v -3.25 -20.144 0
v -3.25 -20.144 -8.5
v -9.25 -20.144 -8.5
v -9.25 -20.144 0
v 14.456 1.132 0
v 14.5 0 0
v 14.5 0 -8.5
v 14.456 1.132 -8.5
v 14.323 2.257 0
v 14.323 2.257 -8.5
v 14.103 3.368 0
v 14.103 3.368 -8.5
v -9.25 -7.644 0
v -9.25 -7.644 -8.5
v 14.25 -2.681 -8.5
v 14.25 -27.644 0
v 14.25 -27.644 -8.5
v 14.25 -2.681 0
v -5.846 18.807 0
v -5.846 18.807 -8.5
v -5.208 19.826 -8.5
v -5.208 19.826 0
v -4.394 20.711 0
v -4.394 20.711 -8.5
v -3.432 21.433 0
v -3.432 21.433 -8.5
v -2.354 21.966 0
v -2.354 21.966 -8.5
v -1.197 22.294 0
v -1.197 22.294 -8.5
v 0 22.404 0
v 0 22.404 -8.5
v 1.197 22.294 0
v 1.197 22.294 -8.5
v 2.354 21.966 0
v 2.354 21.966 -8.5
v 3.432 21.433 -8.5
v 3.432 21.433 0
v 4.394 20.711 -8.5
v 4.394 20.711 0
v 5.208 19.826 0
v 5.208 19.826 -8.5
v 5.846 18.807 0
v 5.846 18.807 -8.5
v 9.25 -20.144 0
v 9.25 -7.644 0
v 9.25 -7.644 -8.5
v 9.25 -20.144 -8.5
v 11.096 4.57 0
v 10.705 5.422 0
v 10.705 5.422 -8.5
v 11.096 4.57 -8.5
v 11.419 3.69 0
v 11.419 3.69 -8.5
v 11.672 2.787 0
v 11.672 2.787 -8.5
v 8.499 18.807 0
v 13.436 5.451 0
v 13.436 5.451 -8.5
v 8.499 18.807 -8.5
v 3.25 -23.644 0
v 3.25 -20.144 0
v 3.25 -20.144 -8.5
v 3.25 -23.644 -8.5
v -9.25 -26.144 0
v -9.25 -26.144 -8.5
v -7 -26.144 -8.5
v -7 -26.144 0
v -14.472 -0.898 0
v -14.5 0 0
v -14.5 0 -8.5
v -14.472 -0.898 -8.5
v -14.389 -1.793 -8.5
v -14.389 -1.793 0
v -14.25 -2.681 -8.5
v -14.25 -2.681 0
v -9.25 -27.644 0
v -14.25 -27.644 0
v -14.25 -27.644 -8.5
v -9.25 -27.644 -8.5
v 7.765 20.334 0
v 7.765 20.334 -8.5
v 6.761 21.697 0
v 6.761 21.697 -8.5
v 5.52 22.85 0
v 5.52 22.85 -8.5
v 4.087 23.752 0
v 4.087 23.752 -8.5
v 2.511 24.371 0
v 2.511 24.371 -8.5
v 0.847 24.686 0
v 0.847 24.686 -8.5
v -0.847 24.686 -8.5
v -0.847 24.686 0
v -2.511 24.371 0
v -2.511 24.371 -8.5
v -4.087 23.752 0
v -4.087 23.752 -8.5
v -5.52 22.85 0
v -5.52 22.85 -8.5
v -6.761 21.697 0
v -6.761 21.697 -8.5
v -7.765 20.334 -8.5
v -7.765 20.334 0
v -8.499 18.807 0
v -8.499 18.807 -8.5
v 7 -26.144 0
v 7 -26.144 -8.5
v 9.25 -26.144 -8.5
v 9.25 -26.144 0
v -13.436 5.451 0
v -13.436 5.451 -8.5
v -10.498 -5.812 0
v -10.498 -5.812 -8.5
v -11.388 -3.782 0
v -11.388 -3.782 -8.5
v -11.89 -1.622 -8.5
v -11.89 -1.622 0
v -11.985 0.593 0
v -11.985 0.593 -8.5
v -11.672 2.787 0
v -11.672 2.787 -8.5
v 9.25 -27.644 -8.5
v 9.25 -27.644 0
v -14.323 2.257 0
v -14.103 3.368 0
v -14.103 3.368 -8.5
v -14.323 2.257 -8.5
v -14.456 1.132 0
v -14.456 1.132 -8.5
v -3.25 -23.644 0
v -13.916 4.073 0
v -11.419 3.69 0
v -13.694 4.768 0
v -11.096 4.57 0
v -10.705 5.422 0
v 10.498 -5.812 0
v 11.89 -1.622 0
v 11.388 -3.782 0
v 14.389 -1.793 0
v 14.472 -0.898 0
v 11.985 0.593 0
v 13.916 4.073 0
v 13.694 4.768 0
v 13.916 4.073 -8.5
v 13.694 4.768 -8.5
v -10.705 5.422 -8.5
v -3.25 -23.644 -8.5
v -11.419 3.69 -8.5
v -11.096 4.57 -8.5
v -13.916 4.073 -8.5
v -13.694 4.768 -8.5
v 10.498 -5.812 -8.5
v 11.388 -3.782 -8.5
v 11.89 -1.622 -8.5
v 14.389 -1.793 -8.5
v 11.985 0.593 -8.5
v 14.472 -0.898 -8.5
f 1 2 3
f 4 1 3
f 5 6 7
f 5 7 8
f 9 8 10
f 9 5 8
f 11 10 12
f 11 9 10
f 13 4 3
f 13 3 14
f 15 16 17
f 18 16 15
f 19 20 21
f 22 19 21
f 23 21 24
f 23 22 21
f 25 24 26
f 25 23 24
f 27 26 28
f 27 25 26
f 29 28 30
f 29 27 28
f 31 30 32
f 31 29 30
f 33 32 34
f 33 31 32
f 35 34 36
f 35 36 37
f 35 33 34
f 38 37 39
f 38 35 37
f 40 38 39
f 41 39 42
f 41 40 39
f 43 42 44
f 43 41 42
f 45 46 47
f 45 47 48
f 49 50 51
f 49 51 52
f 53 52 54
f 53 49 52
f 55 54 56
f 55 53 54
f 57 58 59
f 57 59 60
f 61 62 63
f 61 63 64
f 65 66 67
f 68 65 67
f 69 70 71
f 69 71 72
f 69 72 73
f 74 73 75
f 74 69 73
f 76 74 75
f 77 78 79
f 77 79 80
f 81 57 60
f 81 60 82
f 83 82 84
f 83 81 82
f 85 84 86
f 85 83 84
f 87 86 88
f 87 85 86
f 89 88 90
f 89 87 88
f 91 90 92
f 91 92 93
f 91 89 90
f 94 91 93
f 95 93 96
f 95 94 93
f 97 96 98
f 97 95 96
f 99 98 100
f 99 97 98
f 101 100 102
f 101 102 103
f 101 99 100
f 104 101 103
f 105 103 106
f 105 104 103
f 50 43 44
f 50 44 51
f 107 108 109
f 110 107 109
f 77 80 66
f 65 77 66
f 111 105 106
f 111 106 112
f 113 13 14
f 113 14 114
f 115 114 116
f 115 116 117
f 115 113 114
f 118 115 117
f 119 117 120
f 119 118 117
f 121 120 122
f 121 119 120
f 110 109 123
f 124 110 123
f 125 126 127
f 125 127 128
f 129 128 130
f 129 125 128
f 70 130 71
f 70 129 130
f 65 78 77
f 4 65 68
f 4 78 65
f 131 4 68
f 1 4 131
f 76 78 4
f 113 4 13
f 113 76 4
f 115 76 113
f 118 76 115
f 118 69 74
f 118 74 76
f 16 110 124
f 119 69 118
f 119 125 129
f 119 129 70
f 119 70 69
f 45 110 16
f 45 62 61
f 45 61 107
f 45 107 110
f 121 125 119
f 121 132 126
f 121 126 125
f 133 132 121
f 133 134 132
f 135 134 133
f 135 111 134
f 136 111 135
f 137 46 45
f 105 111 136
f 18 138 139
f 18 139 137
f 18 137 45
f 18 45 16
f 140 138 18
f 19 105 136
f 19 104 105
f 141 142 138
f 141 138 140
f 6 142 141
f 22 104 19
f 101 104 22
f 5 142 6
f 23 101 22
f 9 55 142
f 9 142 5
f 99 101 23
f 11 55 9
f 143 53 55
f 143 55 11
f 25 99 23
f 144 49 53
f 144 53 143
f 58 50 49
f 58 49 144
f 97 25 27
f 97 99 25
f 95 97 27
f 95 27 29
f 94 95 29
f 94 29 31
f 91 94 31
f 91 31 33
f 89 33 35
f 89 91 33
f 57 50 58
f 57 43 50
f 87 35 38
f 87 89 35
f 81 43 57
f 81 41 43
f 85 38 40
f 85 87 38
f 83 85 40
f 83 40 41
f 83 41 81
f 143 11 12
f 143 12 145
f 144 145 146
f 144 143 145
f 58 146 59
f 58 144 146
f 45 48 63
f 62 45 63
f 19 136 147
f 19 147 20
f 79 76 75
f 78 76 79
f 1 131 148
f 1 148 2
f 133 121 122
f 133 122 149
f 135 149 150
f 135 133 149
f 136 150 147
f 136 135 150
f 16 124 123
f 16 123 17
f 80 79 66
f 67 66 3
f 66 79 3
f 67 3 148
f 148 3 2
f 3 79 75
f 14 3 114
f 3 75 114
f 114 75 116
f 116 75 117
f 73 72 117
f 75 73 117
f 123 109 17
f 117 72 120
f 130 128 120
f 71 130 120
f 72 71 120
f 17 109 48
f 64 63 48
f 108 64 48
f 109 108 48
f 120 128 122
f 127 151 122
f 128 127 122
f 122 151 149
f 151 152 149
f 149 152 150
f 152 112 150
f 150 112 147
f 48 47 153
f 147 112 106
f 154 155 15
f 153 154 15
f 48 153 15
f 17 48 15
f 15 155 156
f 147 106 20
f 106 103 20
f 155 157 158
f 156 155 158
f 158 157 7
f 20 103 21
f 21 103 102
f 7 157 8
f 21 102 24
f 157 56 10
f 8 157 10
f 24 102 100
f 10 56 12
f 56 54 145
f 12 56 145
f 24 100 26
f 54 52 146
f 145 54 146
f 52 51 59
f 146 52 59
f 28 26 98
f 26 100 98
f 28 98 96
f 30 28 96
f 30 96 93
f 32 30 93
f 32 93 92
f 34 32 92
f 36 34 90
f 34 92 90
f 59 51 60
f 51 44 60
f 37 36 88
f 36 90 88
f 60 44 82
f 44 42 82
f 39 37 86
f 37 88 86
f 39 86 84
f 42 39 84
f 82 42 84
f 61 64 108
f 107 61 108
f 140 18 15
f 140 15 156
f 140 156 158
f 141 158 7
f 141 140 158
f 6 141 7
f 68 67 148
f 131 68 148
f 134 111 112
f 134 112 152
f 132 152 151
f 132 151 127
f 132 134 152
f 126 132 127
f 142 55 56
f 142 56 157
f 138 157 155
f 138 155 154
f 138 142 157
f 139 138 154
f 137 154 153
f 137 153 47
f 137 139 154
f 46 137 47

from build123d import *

# Parameters (mm, degrees)
F1_DEPTH = 8.5


# Not quite as in the source:
# - a feature names something its author has since deleted; it is built from what else it names


with BuildPart() as f1:
    # F0 (on Top) → F1 (new body)
    with BuildSketch(Plane.XY):
        with BuildLine():
            ThreePointArc((-9.25, -7.6444424257), (-11.6891485981, -2.7136331829), (-11.6717637121, 2.7874597484))
            ThreePointArc((-11.6717637121, 2.7874597484), (-11.2656904289, 4.1333060811), (-10.7050113586, 5.42242859))
            Line((-10.7050113586, 5.42242859), (-5.8459149373, 18.8072078091))
            ThreePointArc((-5.8459149373, 18.8072078091), (0, 22.4041745059), (5.8459149373, 18.8072078091))
            Line((5.8459149373, 18.8072078091), (10.7050113586, 5.42242859))
            ThreePointArc((10.7050113586, 5.42242859), (11.2656904289, 4.1333060811), (11.6717637121, 2.7874597484))
            ThreePointArc((11.6717637121, 2.7874597484), (11.6891485981, -2.7136331829), (9.25, -7.6444424257))
            Line((9.25, -7.6444424257), (9.25, -11.1663557171))
            Line((9.25, -11.1663557171), (9.25, -20.1444424257))
            Line((9.25, -20.1444424257), (3.25, -20.1444424257))
            Line((3.25, -20.1444424257), (3.25, -21.1444424257))
            Line((3.25, -21.1444424257), (3.25, -23.6444424257))
            Line((3.25, -23.6444424257), (7, -26.1444424257))
            Line((7, -26.1444424257), (9.25, -26.1444424257))
            Line((9.25, -26.1444424257), (9.25, -27.6444424257))
            Line((9.25, -27.6444424257), (14.25, -27.6444424257))
            Line((14.25, -27.6444424257), (14.25, -21.4303609628))
            Line((14.25, -21.4303609628), (14.25, -2.6809513237))
            ThreePointArc((14.25, -2.6809513237), (14.437364718, -1.3462912018), (14.5, 0))
            ThreePointArc((14.5, 0), (14.400503927, 1.6957259941), (14.1033811521, 3.3681805293))
            ThreePointArc((14.1033811521, 3.3681805293), (13.8091695526, 4.4223111907), (13.4362898945, 5.4512488358))
            Line((13.4362898945, 5.4512488358), (8.4985279846, 18.8072078091))
            ThreePointArc((8.4985279846, 18.8072078091), (0, 24.7259901099), (-8.4985279846, 18.8072078091))
            Line((-8.4985279846, 18.8072078091), (-13.4362898945, 5.4512488358))
            ThreePointArc((-13.4362898945, 5.4512488358), (-13.8091695526, 4.4223111907), (-14.1033811521, 3.3681805293))
            ThreePointArc((-14.1033811521, 3.3681805293), (-14.400503927, 1.6957259941), (-14.5, 0))
            ThreePointArc((-14.5, 0), (-14.437364718, -1.3462912018), (-14.25, -2.6809513237))
            Line((-14.25, -2.6809513237), (-14.25, -21.1444424257))
            Line((-14.25, -21.1444424257), (-14.25, -27.6444424257))
            Line((-14.25, -27.6444424257), (-9.25, -27.6444424257))
            Line((-9.25, -27.6444424257), (-9.25, -26.1444424257))
            Line((-9.25, -26.1444424257), (-7, -26.1444424257))
            Line((-7, -26.1444424257), (-3.25, -23.6444424257))
            Line((-3.25, -23.6444424257), (-3.25, -21.1444424257))
            Line((-3.25, -21.1444424257), (-3.25, -20.1444424257))
            Line((-3.25, -20.1444424257), (-9.25, -20.1444424257))
            Line((-9.25, -20.1444424257), (-9.25, -11.1663557171))
            Line((-9.25, -11.1663557171), (-9.25, -7.6444424257))
        make_face()
    extrude(amount=-F1_DEPTH)


solid = f1.part
